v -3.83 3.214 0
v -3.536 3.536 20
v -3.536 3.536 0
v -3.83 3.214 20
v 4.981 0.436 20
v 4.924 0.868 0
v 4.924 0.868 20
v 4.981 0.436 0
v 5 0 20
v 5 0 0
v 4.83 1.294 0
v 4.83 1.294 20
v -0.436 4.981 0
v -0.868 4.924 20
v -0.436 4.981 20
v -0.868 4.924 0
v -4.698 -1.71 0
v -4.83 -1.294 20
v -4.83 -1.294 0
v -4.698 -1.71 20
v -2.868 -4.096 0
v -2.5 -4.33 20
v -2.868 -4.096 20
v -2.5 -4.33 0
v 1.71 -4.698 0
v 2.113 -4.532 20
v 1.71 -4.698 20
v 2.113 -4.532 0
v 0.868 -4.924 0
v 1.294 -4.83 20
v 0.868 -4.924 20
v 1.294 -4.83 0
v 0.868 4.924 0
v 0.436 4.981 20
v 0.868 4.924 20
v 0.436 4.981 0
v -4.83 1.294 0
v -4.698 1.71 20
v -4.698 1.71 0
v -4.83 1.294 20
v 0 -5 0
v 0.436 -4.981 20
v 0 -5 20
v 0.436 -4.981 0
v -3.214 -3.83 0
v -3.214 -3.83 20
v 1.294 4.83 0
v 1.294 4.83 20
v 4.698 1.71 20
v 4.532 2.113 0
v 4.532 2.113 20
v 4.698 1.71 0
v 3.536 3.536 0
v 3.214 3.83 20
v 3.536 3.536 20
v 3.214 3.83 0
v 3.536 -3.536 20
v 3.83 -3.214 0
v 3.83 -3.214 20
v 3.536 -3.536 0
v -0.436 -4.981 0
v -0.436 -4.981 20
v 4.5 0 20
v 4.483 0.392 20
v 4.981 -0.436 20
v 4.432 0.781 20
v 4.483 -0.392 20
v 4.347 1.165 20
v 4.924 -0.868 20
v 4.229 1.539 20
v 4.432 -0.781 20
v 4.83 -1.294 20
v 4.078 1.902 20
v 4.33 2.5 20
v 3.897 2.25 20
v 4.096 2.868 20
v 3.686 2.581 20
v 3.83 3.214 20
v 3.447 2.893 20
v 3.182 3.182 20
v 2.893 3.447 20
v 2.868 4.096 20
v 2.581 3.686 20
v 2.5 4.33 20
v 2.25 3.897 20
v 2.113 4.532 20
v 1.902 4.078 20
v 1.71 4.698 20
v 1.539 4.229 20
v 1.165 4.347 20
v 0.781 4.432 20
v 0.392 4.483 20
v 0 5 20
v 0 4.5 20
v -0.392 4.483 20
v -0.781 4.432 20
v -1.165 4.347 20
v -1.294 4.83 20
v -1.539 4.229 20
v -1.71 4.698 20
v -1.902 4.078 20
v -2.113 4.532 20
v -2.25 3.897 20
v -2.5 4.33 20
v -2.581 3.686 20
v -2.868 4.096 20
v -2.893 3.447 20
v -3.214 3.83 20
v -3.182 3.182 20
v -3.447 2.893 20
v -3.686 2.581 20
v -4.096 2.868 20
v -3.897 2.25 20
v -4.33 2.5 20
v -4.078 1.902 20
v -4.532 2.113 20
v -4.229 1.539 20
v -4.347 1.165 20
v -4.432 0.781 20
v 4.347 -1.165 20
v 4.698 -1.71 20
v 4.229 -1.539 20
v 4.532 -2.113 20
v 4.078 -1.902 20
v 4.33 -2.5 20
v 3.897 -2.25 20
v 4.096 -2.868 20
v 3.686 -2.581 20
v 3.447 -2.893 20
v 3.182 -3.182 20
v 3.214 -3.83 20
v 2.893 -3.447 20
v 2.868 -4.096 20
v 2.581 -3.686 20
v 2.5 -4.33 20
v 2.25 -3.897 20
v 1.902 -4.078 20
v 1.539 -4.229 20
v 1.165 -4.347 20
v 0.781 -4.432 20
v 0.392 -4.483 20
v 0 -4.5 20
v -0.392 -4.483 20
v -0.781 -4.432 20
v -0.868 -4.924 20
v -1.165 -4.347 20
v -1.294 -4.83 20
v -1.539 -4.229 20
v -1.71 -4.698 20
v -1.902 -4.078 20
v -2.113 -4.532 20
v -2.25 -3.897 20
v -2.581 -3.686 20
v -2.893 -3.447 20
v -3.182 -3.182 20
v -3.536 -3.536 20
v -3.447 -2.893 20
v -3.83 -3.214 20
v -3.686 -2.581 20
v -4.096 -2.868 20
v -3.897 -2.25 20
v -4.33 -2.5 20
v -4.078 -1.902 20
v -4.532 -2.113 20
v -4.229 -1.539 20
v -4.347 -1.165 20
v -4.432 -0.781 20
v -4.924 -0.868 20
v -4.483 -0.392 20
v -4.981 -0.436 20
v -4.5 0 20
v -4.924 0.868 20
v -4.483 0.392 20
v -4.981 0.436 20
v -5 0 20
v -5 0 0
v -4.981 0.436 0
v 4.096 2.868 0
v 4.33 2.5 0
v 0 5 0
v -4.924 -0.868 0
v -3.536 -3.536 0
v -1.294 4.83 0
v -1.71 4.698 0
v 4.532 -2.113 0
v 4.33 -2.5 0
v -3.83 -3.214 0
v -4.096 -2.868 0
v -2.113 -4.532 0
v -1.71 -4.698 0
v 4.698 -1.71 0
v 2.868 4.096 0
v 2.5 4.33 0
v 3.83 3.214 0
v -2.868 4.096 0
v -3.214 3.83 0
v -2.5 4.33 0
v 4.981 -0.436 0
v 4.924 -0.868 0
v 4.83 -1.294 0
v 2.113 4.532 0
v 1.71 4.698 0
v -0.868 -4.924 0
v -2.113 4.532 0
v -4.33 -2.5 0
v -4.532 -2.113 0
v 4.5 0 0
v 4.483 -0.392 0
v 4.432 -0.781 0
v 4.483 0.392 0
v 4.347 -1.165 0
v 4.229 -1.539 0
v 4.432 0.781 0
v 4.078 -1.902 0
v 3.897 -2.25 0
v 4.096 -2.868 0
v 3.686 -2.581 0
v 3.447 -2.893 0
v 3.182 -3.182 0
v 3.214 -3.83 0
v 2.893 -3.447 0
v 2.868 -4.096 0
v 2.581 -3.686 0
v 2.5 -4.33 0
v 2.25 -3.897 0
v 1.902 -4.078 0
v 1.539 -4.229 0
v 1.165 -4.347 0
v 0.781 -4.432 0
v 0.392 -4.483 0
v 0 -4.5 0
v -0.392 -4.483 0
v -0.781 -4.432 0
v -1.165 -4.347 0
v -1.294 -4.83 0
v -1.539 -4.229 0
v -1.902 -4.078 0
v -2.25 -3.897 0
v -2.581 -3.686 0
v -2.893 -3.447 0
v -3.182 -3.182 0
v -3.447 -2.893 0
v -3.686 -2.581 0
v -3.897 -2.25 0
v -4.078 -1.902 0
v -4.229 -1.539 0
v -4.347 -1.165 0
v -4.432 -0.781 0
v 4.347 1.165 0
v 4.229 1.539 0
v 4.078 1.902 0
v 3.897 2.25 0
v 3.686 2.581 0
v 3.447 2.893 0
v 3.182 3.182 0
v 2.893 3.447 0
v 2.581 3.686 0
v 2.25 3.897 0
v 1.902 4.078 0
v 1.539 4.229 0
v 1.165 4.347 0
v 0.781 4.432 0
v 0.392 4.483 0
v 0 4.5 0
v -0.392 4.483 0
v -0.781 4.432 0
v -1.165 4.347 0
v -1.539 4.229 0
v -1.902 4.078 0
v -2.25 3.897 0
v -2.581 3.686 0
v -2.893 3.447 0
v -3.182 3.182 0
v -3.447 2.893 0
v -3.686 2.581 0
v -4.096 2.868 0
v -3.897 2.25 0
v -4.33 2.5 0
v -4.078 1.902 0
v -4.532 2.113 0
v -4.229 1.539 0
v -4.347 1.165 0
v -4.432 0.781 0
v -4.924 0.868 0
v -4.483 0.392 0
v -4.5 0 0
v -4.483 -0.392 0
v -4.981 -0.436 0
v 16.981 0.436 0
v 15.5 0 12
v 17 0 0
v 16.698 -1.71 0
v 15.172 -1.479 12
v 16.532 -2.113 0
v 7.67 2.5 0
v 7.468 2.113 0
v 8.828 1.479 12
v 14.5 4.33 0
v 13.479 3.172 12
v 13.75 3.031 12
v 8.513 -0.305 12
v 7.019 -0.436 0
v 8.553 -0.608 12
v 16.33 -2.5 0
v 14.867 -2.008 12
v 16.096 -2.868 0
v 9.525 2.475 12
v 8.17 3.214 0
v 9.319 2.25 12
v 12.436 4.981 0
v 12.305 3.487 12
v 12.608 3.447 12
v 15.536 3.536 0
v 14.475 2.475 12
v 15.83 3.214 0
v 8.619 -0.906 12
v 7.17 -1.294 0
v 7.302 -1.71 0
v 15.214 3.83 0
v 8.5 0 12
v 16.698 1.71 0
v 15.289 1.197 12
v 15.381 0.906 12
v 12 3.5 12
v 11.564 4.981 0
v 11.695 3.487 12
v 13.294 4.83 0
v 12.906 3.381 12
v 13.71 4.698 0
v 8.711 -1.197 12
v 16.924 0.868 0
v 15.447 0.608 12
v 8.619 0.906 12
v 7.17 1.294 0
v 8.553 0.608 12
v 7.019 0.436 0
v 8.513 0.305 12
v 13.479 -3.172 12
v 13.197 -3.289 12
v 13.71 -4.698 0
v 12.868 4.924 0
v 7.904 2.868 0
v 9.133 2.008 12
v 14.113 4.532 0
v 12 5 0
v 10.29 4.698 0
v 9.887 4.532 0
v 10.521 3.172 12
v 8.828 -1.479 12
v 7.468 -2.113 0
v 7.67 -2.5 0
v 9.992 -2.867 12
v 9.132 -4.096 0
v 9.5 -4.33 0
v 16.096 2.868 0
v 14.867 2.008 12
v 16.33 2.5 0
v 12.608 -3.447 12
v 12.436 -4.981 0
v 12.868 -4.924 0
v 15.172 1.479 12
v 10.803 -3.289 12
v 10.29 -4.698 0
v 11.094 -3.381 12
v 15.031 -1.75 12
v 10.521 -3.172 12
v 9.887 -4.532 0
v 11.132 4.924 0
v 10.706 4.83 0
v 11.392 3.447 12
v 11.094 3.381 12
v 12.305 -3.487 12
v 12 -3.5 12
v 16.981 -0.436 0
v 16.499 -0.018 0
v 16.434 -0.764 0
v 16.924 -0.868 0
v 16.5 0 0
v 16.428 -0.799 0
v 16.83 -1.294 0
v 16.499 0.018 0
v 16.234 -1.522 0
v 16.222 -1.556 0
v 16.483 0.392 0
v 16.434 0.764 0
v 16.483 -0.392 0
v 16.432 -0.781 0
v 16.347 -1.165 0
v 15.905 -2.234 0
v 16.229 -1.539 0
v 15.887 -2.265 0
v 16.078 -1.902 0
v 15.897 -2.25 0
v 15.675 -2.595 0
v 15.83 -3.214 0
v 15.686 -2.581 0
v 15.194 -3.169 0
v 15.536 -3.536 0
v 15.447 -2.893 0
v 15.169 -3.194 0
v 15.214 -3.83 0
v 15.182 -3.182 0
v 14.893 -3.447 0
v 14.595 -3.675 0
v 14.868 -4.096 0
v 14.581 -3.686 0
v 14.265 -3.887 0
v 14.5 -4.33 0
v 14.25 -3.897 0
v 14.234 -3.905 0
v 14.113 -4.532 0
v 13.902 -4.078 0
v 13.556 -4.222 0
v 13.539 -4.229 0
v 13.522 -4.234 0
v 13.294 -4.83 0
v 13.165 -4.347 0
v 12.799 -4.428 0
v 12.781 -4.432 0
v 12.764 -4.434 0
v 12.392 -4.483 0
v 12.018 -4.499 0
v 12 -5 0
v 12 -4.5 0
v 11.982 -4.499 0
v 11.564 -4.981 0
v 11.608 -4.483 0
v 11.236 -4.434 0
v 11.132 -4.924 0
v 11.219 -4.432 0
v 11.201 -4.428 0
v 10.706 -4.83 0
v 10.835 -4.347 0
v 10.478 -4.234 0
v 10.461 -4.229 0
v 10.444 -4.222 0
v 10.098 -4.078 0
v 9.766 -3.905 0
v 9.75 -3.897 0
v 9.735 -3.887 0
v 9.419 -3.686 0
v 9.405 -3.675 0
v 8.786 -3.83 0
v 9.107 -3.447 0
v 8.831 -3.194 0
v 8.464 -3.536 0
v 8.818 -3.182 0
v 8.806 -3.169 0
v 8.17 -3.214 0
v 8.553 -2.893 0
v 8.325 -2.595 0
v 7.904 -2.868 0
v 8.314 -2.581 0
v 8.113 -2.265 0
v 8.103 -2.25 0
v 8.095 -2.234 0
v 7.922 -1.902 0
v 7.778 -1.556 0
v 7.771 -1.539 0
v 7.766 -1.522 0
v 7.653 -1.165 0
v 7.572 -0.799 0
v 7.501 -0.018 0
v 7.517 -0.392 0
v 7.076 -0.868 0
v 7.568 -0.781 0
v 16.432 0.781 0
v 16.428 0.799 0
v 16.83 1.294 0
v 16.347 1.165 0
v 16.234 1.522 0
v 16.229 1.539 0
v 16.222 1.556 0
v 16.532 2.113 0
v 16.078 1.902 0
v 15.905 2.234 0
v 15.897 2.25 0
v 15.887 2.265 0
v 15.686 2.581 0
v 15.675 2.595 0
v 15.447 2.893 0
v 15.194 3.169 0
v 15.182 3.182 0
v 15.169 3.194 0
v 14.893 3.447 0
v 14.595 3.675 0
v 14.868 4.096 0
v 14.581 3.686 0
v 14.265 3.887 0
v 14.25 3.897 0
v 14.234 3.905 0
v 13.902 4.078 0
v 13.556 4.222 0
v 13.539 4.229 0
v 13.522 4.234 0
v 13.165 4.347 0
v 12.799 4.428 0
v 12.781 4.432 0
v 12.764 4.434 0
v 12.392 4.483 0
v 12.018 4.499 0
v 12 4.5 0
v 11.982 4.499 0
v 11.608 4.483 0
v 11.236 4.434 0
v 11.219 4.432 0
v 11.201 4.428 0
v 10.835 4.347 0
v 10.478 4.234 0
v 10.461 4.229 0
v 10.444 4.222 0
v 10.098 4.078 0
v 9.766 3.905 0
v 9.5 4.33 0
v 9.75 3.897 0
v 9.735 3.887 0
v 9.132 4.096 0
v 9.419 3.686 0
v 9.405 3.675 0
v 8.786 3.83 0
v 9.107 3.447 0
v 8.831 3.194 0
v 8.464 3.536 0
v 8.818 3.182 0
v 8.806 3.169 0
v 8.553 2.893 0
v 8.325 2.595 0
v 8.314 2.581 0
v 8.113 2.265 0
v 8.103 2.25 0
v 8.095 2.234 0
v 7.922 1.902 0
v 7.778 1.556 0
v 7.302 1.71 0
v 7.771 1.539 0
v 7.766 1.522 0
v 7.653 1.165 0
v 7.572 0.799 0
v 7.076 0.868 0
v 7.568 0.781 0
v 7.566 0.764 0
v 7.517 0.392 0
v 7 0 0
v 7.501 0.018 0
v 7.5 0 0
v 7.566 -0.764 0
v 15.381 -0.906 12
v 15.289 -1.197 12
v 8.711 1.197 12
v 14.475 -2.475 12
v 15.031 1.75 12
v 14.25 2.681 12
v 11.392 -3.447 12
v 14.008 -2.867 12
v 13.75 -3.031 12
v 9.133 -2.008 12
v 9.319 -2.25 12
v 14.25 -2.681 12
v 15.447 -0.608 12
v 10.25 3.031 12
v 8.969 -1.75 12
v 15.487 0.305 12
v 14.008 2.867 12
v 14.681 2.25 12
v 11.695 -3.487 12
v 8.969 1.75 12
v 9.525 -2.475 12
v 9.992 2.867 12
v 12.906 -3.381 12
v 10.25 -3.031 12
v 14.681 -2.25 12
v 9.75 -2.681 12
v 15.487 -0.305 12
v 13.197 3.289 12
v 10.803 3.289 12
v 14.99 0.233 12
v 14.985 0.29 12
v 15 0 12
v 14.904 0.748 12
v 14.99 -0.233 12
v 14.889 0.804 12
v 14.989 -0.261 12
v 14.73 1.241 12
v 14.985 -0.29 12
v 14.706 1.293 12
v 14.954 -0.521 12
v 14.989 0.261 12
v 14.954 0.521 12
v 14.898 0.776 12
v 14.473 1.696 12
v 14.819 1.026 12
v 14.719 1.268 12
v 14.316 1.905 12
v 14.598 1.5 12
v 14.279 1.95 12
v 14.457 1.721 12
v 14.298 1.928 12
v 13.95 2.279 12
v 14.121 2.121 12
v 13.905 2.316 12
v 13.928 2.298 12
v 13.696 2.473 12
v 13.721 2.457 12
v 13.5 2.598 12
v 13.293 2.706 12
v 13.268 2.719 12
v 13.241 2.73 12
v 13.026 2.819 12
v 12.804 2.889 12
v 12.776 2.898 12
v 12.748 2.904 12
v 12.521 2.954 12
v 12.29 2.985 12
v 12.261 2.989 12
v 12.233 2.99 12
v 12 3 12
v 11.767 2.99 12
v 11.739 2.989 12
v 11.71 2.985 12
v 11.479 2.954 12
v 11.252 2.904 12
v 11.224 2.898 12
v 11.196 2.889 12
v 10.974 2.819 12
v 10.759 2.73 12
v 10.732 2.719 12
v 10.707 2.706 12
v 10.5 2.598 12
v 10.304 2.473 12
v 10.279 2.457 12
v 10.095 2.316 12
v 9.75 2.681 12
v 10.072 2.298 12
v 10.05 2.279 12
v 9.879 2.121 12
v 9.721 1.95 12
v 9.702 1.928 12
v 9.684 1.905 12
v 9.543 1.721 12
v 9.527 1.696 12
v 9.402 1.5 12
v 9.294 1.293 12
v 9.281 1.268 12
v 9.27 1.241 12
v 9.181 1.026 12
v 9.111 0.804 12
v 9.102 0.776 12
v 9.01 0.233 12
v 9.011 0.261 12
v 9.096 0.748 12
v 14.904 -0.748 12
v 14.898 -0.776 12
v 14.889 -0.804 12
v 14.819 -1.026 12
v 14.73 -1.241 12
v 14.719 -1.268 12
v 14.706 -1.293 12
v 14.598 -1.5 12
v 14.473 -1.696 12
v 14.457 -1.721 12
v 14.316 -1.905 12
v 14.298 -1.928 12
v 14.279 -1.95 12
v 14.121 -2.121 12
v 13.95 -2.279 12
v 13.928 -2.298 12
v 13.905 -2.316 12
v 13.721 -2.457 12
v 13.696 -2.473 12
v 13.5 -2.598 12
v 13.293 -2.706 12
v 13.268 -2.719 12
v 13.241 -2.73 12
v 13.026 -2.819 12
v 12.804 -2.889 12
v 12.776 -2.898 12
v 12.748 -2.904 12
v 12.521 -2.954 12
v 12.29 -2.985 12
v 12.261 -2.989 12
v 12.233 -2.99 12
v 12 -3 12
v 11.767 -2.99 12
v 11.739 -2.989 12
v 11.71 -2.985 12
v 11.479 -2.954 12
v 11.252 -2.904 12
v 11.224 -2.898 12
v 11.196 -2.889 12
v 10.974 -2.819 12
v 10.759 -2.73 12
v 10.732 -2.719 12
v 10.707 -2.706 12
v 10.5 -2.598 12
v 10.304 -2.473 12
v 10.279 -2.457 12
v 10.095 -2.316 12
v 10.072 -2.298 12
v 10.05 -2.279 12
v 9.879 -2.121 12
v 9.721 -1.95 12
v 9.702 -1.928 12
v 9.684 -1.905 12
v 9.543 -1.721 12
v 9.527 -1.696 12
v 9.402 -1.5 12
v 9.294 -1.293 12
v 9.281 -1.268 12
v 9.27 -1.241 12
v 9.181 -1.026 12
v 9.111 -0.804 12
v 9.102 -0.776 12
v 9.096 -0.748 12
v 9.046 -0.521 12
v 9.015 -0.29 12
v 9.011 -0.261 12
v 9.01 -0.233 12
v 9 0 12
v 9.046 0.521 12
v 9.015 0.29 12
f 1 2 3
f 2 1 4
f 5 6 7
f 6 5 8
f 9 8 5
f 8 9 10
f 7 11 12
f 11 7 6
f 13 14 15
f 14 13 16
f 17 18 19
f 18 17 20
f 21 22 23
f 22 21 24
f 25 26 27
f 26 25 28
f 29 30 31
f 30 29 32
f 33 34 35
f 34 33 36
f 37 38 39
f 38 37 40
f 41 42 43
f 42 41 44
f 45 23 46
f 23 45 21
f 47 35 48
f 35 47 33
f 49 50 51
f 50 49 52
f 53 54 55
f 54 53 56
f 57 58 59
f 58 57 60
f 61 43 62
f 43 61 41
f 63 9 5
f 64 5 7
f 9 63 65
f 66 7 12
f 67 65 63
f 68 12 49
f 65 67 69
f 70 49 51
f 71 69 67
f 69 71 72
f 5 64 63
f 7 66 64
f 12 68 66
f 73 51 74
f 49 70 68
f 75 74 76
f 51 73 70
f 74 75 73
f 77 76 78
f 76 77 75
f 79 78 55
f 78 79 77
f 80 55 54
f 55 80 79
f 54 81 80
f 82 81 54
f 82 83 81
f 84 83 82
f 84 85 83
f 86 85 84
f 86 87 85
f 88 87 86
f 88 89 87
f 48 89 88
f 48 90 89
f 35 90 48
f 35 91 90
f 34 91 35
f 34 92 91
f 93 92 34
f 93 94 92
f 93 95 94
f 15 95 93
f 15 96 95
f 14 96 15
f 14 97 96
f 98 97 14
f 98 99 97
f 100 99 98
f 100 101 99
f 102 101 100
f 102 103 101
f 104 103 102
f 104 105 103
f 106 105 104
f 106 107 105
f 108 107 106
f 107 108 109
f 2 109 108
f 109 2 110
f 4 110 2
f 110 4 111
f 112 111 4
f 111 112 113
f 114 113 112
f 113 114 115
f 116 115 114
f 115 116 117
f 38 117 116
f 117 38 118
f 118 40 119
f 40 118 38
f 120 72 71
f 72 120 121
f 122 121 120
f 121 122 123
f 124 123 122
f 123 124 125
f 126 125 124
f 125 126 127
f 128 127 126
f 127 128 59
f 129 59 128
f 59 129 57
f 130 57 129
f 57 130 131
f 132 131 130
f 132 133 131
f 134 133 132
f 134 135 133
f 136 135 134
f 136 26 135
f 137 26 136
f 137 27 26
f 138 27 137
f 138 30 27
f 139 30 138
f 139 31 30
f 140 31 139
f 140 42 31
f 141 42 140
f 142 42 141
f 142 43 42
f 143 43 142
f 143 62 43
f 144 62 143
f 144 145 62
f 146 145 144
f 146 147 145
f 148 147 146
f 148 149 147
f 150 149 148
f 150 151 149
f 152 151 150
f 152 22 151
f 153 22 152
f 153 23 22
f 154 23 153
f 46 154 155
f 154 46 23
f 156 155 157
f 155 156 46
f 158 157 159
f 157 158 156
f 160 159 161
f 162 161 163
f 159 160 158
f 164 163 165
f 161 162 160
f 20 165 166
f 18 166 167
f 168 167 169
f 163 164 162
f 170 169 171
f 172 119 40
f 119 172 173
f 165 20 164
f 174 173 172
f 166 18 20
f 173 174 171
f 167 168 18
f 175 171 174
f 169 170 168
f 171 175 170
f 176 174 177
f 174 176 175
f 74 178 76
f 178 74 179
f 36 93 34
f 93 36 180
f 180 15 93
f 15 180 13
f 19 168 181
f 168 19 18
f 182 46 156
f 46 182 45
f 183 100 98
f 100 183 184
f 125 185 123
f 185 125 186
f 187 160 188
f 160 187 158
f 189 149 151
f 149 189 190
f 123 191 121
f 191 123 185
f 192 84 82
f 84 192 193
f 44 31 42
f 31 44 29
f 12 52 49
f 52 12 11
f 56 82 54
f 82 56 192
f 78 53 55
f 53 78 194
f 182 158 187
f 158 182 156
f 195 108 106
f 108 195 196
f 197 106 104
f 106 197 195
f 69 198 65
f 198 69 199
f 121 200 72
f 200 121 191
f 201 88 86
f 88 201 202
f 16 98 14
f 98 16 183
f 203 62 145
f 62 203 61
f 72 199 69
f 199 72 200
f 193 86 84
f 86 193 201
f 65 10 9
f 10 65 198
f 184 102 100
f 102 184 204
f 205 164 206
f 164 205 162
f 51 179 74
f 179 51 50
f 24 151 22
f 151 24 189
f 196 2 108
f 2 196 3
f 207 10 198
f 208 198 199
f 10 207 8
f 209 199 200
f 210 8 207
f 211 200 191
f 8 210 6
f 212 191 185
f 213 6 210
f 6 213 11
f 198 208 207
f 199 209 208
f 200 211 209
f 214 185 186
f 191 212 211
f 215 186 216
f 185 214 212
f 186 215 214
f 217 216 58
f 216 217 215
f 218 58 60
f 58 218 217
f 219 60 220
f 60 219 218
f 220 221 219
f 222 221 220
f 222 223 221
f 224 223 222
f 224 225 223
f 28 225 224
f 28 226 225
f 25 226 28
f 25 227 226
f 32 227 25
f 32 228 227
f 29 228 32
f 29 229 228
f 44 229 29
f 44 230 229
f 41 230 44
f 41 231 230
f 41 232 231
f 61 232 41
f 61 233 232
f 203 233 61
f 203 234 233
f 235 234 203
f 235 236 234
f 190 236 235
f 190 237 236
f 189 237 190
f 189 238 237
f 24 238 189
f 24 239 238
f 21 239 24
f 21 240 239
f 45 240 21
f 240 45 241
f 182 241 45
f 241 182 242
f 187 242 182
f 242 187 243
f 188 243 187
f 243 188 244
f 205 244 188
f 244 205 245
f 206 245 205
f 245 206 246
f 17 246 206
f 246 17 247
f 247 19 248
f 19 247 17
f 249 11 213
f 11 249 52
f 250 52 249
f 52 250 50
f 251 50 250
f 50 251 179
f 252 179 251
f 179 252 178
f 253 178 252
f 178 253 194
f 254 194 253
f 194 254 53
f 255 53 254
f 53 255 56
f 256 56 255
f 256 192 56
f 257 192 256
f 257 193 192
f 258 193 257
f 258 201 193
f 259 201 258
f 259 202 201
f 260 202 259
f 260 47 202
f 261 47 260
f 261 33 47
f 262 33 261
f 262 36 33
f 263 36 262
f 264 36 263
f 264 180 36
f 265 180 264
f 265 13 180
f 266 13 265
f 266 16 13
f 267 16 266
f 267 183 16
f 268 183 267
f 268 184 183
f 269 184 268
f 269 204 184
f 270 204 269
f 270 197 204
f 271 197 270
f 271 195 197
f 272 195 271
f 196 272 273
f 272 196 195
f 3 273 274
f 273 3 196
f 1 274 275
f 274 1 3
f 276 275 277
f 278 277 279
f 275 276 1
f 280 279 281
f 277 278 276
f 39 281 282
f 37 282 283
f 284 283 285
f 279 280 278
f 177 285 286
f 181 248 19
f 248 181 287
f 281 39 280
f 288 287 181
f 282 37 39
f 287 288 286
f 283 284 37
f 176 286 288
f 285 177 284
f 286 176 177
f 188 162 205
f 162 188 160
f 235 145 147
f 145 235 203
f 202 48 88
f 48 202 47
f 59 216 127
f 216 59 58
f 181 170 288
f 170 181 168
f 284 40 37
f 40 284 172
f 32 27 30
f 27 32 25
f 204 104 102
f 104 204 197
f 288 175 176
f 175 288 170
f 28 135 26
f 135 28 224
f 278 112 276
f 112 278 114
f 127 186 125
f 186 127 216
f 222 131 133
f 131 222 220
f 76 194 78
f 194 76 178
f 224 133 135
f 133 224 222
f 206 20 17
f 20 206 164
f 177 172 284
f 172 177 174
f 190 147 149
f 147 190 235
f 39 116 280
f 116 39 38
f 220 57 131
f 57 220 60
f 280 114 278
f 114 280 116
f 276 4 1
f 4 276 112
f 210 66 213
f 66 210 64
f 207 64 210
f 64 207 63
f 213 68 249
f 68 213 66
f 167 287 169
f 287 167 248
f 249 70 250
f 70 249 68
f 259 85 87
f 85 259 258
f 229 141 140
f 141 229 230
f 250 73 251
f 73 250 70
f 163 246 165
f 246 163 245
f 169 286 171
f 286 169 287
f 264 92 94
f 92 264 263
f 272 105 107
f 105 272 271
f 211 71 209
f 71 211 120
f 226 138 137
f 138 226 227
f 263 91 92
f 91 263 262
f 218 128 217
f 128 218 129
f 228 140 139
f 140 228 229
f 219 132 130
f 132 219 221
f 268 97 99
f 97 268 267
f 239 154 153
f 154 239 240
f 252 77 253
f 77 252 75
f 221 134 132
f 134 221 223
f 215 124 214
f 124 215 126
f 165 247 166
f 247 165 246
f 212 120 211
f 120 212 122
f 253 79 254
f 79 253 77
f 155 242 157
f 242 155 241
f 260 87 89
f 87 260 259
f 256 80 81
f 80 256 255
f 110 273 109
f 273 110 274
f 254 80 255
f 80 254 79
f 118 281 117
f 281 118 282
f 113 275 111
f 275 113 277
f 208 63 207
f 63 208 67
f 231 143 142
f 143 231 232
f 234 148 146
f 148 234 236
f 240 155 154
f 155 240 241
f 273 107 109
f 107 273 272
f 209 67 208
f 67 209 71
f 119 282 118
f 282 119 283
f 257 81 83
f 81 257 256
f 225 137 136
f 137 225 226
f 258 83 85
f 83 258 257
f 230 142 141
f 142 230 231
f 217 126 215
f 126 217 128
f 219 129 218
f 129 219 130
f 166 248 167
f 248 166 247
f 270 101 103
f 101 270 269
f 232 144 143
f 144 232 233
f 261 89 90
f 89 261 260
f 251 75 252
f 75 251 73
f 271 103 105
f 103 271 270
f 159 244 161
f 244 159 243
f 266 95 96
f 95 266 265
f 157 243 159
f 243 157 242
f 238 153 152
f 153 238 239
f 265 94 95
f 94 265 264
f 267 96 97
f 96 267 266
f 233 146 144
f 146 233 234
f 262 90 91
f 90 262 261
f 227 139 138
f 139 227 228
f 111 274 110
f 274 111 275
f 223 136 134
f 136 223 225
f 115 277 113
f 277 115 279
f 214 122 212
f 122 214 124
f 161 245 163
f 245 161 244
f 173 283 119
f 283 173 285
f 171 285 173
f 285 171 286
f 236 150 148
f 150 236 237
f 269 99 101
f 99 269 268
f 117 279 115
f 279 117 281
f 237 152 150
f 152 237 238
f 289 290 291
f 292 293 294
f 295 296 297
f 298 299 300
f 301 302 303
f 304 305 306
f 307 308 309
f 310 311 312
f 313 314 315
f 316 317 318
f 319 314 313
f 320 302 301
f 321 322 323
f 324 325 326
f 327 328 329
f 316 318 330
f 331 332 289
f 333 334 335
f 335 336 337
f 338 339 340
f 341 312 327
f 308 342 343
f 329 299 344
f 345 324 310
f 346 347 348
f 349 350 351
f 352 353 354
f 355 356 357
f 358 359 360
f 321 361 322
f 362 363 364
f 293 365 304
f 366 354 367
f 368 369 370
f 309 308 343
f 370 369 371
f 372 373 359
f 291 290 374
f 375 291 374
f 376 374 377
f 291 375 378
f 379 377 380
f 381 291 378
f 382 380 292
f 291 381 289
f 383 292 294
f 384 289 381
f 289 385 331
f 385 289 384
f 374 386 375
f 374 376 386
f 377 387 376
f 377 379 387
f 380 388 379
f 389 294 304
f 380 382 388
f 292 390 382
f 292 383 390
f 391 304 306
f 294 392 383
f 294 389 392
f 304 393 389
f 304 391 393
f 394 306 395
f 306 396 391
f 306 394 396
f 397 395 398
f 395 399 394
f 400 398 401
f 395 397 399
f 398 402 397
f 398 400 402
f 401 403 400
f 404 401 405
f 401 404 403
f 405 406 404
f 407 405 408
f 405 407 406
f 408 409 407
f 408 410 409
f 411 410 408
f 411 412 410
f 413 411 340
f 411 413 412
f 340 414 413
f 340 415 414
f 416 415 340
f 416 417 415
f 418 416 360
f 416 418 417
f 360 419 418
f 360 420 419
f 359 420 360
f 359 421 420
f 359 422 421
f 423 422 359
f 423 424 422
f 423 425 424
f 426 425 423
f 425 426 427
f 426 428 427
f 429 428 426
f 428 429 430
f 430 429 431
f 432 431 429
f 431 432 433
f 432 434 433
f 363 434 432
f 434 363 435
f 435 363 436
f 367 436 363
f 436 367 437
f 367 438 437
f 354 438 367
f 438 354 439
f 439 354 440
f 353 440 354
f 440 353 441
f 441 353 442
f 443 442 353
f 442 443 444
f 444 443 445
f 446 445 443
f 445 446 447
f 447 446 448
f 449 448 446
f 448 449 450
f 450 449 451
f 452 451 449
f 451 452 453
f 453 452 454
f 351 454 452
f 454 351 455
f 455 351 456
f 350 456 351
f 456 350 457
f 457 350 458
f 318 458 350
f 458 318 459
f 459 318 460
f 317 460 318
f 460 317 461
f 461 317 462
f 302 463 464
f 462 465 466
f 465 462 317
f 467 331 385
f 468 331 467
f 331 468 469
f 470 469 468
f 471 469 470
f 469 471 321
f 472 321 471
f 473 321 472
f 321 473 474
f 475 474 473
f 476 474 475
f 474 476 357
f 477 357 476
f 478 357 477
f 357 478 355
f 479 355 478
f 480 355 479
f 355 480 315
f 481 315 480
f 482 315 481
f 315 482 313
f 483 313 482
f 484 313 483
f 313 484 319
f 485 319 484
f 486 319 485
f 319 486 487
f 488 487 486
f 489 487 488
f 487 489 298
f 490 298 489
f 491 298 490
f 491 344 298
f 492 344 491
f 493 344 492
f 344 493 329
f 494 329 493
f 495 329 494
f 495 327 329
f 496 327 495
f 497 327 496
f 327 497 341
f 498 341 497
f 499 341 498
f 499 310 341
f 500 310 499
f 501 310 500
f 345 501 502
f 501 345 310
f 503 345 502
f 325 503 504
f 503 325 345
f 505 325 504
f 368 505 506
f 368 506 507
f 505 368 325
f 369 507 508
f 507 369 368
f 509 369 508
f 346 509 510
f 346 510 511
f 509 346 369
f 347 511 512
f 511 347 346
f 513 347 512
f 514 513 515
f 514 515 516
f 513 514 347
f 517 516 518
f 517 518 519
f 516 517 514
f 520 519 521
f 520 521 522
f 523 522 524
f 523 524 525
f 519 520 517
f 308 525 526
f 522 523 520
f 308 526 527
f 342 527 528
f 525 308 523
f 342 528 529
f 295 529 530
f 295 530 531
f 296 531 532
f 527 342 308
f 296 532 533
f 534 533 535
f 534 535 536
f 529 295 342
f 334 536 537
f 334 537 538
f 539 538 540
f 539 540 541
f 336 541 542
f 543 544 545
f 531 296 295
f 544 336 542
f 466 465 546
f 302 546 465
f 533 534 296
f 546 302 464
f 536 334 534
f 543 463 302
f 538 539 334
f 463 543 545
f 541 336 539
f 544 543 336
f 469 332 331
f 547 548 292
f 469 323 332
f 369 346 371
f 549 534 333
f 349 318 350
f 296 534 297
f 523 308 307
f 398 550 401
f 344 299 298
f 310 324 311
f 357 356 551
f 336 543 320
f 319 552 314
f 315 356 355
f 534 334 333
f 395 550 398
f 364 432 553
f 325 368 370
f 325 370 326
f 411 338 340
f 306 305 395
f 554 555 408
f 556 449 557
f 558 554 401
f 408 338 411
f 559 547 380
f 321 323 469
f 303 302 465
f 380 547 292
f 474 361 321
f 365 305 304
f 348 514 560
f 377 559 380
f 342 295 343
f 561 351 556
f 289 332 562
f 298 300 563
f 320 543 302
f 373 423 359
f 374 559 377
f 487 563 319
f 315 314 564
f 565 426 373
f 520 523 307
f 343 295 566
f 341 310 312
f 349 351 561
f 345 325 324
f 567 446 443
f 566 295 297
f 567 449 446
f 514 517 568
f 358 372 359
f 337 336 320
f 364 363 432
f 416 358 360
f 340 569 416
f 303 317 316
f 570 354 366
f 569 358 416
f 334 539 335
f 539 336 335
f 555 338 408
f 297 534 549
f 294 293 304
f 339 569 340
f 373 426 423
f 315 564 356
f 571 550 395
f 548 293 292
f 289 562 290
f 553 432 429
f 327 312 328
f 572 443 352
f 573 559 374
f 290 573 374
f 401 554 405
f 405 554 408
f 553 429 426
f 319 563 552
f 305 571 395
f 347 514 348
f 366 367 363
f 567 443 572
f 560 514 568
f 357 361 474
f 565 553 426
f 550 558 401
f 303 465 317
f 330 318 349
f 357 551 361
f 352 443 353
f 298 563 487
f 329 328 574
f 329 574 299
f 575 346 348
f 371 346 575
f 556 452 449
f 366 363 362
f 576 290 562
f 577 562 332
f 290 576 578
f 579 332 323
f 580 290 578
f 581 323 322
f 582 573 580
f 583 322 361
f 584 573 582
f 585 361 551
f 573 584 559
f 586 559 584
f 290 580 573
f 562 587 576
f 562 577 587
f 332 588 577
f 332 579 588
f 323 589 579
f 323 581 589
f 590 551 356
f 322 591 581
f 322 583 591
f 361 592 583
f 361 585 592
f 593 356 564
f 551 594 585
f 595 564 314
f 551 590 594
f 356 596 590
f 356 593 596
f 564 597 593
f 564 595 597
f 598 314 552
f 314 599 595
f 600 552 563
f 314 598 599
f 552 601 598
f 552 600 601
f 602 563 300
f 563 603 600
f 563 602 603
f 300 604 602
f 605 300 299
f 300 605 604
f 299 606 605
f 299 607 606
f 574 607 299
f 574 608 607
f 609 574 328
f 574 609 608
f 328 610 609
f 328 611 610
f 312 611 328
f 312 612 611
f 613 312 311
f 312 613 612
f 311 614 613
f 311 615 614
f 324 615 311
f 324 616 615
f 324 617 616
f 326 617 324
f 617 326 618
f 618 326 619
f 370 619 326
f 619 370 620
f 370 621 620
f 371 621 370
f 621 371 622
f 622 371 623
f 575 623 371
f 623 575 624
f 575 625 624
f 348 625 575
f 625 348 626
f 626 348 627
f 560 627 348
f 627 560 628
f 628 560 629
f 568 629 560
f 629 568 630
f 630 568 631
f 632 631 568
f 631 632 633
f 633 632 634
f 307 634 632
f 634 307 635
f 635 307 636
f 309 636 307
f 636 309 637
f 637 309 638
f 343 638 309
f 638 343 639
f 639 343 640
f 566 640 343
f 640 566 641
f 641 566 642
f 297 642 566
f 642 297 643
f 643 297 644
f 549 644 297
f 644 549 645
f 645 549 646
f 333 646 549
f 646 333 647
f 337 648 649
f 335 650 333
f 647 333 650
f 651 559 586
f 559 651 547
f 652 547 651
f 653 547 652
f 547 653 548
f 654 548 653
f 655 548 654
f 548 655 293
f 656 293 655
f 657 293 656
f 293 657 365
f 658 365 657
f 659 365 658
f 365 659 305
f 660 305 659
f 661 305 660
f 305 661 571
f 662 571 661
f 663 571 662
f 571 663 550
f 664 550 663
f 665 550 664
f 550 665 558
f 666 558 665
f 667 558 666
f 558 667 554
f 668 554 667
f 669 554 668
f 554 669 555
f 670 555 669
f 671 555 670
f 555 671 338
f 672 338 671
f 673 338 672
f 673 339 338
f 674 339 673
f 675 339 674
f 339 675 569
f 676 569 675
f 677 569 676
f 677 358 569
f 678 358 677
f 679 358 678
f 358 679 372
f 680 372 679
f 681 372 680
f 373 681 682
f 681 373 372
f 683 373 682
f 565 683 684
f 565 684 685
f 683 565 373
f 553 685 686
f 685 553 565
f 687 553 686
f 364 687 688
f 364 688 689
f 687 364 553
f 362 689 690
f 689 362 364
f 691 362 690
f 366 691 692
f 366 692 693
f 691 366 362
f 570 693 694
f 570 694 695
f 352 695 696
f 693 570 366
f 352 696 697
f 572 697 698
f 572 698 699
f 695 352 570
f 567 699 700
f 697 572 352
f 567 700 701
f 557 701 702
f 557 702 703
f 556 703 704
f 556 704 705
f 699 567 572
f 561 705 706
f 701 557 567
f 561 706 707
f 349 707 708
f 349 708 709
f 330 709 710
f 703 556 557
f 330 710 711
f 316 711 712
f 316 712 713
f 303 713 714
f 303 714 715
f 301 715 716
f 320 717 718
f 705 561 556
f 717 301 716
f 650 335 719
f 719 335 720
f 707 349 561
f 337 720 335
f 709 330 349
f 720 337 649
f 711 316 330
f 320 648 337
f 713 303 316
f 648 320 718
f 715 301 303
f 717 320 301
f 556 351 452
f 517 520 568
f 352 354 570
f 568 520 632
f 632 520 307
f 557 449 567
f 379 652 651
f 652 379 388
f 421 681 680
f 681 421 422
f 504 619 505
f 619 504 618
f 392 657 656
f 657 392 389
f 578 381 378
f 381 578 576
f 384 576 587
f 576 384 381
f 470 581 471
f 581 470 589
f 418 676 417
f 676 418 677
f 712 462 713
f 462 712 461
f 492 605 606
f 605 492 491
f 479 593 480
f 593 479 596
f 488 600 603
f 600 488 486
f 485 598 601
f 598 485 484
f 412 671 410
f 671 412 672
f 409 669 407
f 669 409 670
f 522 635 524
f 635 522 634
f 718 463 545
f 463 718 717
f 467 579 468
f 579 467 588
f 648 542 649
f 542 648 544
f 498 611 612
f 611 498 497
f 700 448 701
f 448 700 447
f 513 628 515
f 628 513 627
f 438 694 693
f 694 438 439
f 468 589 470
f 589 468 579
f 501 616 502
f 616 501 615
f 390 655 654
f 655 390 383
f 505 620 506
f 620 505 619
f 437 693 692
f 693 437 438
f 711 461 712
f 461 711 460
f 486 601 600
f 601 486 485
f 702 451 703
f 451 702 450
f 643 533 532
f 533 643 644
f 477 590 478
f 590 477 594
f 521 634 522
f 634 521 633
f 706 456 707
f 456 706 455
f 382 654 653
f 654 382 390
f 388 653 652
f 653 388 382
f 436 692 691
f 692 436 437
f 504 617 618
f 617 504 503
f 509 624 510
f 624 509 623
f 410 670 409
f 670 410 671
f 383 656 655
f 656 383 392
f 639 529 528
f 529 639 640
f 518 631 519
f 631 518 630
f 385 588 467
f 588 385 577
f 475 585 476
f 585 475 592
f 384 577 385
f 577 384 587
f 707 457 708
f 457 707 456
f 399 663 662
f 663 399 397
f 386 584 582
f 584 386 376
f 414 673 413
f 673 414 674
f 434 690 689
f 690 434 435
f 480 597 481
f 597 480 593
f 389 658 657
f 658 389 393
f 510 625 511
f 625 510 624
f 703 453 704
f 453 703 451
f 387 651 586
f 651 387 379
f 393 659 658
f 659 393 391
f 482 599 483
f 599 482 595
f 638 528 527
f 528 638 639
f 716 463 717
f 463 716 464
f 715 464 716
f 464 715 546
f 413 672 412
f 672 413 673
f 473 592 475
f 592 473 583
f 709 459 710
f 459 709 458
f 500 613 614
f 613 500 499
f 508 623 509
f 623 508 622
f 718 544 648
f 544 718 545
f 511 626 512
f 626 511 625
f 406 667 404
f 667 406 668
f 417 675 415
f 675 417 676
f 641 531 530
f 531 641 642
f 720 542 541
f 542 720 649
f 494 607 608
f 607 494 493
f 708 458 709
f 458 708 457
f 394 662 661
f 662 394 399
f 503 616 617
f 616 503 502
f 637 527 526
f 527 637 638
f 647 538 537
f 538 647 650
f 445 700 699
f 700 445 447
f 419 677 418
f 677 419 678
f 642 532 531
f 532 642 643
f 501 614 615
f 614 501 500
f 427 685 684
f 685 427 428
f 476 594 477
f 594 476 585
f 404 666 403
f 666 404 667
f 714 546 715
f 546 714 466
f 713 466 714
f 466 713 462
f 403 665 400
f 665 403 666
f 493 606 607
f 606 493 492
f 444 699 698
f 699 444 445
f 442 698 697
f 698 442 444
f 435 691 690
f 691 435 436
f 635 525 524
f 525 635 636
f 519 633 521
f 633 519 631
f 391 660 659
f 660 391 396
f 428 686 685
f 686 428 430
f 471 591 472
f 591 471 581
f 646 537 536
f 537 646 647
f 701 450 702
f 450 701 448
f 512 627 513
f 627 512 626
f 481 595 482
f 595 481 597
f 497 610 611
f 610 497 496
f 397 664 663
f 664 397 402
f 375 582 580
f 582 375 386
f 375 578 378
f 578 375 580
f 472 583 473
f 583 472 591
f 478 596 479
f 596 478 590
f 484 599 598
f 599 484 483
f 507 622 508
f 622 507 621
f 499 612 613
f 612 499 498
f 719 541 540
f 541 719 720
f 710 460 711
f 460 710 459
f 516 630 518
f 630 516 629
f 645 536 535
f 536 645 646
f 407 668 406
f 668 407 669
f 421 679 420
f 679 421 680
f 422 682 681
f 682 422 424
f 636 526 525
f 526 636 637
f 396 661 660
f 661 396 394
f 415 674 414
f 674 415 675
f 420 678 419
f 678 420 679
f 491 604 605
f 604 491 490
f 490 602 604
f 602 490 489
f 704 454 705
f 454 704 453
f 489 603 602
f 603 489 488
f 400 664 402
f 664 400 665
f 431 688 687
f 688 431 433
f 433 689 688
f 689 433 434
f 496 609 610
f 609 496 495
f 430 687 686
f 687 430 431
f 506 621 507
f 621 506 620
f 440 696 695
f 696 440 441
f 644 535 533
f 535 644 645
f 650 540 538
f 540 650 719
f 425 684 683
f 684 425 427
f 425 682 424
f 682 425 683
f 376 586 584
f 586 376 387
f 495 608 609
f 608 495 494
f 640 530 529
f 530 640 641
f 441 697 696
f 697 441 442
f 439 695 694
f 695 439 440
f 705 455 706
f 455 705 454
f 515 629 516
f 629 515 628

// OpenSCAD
/*
 * Geometric primitives I had to carve several times, e.g. a carved truncated cone, a carved cylinder (i.e. a pipe).
 *
 */
 
 // Examples
$fn = 72;
pipe(10, 9, 20, false);

translate([12, 0, 0])
rejuvenating_pipe(10, 7, 9, 6, 12, false);
 
module pipe(d_out, d_in, h, center=true)
{
    difference()
    {
        cylinder(d=d_out, h=h, center=center);
        translate([0, 0, center ? 0 : -1])
        cylinder(d=d_in, h=h+2, center=center);
    }
}


// A rejuvenating pipe is a carved truncated cone (German: ausgehoehlter Kegelstumpf)
module rejuvenating_pipe(d1_out, d2_out, d1_in, d2_in, h, center=true)
{
    // The cut out must be larger to avoid corrupt meshes, so similar triangles to the rescue!
    r1_old = d1_in/2;
    r2_old = d2_in/2;
    rem = (h + 1) * (r1_old - r2_old) / h;
    r2_new = r1_old - rem;
    r1_new = rem + r2_old;
 
    difference()
    {
        cylinder(d1=d1_out, d2=d2_out, h=h, center=center);
 
        translate([0, 0, center ? 0 : -1])
        cylinder(r1=r1_new, r2=r2_new, h=h+2, center=center);
    }
}
